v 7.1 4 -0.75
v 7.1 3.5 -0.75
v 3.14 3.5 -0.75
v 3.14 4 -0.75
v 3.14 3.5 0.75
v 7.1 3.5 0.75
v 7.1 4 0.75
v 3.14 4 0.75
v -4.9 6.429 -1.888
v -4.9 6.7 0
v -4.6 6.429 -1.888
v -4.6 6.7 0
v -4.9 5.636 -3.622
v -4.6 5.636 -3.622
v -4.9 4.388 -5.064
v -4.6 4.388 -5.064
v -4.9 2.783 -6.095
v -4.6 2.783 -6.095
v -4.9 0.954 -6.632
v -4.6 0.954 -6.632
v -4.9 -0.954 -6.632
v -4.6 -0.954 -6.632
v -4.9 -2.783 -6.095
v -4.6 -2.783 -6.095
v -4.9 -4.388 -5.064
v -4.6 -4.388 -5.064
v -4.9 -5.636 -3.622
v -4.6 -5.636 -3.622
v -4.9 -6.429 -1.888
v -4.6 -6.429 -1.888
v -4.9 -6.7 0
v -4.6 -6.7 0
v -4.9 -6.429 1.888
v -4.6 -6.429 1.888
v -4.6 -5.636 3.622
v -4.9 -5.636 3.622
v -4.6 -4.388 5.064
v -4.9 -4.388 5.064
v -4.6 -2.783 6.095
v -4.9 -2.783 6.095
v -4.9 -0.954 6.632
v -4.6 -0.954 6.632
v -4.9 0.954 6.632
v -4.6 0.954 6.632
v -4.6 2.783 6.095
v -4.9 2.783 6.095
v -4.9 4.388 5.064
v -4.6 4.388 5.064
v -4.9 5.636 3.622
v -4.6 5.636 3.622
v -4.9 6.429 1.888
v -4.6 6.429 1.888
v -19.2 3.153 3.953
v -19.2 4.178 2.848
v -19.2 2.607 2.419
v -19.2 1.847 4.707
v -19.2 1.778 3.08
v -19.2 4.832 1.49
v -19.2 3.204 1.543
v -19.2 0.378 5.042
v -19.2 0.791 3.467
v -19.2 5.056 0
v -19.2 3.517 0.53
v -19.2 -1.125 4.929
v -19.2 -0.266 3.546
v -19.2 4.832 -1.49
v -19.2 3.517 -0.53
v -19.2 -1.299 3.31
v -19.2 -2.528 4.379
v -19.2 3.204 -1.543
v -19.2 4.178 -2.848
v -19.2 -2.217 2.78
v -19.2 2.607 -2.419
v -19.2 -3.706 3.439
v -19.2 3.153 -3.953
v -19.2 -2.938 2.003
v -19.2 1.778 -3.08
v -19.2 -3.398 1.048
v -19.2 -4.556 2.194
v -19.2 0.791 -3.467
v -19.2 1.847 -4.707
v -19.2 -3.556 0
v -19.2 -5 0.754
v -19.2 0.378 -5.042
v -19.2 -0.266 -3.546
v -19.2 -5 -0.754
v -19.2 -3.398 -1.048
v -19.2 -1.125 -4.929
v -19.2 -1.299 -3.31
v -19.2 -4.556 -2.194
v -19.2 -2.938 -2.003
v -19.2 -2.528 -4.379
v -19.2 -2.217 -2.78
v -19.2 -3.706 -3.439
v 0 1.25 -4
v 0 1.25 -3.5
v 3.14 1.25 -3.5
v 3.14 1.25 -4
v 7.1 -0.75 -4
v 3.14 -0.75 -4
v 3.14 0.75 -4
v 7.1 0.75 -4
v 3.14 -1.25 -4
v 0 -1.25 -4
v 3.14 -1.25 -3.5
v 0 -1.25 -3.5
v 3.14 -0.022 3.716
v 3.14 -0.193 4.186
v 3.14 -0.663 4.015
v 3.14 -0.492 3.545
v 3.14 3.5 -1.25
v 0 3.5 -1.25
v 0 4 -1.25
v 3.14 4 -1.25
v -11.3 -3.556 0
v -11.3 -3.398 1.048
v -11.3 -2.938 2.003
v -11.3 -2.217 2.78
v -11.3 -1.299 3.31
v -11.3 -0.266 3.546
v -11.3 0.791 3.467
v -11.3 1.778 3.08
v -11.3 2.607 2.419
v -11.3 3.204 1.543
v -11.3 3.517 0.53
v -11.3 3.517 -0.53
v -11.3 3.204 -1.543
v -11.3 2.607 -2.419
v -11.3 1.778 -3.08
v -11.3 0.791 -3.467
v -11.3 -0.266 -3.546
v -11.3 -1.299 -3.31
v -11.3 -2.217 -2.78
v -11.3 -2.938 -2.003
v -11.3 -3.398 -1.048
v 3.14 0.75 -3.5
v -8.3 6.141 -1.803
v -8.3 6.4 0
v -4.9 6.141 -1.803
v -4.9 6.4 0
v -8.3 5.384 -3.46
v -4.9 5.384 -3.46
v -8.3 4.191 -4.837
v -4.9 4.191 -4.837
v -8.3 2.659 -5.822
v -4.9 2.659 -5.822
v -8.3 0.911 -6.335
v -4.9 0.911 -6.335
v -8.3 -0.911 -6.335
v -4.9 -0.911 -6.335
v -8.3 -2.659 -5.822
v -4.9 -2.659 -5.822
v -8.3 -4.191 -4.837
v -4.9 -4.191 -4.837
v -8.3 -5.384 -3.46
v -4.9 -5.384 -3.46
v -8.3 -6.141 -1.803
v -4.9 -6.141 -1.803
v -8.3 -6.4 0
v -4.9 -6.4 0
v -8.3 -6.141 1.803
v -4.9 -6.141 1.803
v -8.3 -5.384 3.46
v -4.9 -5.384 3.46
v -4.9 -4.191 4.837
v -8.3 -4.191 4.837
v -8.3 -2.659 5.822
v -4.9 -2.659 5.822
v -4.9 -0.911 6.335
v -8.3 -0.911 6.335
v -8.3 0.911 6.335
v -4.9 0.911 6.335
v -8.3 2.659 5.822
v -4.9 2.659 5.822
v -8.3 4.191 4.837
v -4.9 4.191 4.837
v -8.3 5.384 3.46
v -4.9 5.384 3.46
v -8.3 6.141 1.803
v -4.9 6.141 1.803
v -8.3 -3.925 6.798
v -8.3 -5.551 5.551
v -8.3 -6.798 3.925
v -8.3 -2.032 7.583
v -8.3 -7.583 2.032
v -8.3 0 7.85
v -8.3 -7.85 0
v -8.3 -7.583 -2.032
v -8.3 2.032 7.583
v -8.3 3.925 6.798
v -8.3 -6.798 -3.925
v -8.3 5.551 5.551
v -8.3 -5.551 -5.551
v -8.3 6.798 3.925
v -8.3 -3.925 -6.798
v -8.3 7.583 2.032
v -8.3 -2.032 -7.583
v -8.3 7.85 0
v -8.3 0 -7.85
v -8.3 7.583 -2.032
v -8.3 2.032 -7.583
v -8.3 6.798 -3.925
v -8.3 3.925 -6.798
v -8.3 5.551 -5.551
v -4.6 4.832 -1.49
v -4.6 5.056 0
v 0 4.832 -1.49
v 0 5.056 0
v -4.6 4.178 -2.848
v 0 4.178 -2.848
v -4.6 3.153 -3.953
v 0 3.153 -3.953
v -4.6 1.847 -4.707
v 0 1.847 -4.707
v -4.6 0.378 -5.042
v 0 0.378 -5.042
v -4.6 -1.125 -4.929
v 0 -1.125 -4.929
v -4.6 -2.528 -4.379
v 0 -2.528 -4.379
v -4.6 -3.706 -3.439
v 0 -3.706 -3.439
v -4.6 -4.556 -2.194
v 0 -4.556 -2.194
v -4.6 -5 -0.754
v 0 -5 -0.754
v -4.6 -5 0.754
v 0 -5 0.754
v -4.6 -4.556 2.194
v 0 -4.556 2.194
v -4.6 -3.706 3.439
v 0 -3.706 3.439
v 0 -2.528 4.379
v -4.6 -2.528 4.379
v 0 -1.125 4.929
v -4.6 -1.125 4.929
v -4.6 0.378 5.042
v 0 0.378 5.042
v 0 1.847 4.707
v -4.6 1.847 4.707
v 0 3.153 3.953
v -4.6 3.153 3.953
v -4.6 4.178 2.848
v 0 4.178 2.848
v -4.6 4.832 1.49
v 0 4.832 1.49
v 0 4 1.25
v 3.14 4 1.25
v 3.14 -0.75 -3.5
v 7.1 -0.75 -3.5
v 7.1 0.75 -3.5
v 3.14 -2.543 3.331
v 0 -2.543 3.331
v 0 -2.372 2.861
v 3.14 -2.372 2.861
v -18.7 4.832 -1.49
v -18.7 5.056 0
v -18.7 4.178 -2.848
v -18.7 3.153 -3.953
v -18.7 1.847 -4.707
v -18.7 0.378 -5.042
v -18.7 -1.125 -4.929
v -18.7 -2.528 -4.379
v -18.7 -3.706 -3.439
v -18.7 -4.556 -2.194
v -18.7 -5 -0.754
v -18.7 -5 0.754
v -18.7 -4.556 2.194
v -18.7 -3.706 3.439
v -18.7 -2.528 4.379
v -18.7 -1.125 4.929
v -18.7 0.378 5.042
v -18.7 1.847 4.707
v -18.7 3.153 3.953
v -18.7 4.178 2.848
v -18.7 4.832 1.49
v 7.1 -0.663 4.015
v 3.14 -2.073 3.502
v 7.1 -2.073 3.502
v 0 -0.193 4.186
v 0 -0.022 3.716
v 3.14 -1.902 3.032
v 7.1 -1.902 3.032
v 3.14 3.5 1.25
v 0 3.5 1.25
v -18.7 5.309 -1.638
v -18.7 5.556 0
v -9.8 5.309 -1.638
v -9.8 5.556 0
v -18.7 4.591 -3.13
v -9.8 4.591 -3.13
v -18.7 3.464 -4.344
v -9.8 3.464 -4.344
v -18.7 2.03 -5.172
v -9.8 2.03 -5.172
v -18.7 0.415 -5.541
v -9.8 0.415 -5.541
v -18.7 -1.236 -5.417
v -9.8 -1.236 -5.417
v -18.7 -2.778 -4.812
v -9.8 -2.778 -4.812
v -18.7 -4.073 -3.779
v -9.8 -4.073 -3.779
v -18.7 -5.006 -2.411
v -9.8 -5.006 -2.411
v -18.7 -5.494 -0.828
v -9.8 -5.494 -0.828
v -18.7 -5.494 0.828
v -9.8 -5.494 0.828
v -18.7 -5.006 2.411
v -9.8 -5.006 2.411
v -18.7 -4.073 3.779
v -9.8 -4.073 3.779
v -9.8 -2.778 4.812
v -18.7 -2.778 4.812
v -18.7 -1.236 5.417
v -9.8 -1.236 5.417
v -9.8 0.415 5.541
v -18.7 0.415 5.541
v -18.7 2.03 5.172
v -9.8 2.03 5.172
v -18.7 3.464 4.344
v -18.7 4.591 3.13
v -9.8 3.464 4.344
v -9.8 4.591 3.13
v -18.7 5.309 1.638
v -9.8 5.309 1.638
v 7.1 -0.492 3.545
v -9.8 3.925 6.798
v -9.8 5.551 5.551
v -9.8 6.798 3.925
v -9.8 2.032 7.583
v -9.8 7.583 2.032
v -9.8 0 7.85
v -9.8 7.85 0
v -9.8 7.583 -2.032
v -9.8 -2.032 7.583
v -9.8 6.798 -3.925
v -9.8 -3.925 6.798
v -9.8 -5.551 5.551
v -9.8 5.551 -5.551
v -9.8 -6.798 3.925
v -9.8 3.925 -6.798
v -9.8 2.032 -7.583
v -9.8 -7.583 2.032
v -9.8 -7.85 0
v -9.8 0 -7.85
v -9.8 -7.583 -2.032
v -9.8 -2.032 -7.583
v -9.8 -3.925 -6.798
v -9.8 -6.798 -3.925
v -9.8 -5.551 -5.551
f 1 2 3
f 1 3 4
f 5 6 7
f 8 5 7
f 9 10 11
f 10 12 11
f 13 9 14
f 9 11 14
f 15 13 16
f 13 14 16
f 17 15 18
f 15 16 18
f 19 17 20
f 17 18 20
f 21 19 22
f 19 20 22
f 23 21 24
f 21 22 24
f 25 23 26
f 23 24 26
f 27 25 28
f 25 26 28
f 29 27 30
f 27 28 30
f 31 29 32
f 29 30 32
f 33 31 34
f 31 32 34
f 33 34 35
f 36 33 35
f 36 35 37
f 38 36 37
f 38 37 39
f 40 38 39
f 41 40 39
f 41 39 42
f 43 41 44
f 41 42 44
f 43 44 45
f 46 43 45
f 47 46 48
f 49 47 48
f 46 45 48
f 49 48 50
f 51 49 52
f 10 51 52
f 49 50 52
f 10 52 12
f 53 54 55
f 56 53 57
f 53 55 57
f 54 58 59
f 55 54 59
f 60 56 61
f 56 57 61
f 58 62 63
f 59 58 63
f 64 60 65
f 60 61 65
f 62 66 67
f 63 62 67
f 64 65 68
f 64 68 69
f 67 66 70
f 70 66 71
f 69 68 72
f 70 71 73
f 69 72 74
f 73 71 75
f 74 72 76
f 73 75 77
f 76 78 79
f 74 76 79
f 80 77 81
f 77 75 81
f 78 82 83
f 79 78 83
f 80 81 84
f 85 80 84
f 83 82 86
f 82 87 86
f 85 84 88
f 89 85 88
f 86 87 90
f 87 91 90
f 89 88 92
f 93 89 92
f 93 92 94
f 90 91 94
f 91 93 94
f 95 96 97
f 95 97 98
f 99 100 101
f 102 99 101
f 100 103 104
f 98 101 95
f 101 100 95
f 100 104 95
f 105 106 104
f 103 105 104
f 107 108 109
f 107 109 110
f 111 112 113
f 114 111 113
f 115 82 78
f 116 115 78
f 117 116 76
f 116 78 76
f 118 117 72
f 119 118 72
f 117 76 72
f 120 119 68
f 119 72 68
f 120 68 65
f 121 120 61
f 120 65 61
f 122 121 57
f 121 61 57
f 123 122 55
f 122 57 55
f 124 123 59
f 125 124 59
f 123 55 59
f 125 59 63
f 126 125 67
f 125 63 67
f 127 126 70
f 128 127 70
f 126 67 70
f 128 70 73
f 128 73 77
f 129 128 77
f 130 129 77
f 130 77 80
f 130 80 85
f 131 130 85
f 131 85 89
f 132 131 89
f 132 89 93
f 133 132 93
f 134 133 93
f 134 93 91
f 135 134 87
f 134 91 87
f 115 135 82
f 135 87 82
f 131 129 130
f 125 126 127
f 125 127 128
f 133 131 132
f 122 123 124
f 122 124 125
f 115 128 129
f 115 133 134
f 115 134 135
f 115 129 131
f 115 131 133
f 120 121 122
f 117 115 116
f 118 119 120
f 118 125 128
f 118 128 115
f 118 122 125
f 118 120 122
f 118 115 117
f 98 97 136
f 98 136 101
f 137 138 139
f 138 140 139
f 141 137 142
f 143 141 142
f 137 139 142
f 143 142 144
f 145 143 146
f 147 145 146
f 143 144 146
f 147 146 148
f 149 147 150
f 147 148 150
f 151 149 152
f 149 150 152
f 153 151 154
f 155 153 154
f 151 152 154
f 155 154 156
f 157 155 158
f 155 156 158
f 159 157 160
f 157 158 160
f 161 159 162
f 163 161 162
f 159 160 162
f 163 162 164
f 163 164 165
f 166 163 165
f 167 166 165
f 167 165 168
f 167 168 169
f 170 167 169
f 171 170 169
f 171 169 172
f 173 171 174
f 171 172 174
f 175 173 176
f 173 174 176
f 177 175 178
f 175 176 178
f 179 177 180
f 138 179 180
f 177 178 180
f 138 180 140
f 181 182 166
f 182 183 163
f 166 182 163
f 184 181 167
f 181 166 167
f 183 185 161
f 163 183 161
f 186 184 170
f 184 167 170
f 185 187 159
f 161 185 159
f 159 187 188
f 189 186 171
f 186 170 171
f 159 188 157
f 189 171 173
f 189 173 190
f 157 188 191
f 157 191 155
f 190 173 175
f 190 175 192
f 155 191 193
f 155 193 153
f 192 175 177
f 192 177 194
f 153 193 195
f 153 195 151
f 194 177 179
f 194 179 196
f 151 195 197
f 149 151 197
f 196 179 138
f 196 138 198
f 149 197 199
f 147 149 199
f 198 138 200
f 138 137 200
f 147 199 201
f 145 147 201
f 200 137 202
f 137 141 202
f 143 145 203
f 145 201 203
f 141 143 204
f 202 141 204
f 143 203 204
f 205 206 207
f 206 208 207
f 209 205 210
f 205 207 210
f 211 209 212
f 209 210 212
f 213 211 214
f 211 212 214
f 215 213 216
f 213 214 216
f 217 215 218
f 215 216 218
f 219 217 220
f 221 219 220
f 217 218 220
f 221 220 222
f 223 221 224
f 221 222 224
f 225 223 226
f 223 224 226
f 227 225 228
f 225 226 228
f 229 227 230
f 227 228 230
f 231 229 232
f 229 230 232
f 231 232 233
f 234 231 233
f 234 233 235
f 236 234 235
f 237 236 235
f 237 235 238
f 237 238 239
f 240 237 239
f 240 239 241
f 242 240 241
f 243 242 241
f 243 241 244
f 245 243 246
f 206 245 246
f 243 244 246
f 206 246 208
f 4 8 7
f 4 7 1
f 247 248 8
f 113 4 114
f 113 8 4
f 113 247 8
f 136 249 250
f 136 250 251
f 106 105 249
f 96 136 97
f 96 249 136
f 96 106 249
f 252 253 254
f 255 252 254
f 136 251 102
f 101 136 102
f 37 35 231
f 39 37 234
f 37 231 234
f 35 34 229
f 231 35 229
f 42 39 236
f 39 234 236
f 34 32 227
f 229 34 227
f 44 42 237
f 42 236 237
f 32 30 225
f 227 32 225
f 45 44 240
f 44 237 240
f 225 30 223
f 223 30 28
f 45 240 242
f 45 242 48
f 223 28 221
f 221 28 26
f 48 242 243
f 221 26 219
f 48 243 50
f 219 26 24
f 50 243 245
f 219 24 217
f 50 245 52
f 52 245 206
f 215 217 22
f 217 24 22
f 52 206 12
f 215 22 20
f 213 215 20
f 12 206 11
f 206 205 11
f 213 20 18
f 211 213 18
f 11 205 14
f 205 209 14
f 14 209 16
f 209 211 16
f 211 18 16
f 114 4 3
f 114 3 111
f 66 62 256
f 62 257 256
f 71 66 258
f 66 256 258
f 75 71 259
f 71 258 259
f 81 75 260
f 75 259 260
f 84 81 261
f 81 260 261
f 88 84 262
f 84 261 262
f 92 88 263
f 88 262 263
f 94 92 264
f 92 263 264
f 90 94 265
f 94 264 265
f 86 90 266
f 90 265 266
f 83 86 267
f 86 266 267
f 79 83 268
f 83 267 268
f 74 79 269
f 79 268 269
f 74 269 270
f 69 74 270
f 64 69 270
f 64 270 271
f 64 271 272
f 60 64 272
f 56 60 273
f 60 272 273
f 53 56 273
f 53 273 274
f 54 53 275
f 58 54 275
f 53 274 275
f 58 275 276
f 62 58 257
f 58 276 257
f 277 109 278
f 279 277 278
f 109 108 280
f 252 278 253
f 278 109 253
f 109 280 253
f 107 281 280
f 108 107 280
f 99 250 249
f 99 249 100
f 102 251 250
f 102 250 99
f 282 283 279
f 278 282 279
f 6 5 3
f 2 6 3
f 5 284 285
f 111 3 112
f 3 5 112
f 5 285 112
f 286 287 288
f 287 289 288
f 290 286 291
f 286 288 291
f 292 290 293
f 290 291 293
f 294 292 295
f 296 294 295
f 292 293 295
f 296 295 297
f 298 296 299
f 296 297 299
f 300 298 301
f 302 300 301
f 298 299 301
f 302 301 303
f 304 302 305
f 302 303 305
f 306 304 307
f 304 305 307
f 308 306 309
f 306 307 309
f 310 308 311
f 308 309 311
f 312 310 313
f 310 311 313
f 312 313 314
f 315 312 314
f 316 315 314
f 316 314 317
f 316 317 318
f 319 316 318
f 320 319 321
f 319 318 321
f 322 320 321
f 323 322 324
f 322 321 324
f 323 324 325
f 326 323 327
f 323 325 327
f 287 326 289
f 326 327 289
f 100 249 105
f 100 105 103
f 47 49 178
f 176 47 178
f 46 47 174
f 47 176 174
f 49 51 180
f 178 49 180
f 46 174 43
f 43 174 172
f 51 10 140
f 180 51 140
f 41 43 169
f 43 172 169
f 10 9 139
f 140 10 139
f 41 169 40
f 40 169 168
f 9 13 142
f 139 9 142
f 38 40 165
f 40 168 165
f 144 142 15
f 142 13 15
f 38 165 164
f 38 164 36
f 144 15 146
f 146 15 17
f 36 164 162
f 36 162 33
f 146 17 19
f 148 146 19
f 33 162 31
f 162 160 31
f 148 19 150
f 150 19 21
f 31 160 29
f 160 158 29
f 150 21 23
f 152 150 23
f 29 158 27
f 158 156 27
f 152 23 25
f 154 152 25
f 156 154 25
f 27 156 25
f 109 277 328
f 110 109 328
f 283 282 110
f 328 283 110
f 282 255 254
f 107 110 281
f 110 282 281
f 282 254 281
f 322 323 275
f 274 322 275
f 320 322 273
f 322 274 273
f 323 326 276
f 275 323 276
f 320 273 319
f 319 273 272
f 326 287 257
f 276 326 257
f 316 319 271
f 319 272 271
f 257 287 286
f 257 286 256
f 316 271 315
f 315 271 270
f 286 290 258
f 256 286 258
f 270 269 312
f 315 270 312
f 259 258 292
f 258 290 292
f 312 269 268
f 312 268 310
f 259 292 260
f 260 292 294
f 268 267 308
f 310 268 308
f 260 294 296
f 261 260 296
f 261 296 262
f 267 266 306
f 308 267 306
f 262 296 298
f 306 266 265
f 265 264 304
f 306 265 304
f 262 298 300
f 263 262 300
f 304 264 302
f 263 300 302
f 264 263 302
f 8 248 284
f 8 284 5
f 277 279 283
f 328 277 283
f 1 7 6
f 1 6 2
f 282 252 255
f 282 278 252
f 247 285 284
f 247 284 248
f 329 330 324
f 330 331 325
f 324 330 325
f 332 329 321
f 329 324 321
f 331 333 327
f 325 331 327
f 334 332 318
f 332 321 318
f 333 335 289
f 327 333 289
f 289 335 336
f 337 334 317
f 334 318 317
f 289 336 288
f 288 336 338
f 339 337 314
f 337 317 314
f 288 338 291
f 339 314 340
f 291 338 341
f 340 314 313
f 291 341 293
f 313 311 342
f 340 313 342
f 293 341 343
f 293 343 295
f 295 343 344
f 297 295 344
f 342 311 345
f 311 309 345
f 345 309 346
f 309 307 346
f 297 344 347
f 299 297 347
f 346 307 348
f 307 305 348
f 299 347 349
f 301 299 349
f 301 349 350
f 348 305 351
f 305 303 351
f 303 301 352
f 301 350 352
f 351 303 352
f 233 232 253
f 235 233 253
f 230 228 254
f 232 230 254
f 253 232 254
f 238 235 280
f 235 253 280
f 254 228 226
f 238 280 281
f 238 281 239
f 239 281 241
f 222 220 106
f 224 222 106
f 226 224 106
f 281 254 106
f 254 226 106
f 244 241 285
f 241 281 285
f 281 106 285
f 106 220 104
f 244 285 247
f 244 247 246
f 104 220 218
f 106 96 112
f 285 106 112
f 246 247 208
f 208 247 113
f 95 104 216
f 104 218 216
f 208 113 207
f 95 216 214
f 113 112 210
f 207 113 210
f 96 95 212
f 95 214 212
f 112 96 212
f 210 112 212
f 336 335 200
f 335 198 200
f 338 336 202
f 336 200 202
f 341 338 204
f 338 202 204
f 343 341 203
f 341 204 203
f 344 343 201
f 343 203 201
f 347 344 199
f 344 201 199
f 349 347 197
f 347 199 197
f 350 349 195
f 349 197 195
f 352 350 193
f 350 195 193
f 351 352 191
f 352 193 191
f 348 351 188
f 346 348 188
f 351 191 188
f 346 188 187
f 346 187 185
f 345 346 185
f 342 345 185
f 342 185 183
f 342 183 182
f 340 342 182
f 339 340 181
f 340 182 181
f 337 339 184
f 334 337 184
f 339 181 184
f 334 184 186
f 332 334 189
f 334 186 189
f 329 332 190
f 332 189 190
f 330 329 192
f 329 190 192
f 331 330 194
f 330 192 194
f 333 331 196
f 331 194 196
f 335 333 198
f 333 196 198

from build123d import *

# Parameters (mm, degrees)
SKETCH2_R           = 3.55625
CUT_EXTRUDE1_DEPTH  = 7.9
SKETCH3_W           = 2.5
SKETCH3_H           = 0.5
SKETCH3_W_2         = 0.5
SKETCH3_H_2         = 2.5
EXTRUDE_THIN1_DEPTH = 7.1
SKETCH4_W           = 0.5
SKETCH4_H           = 0.5
CUT_EXTRUDE3_DEPTH  = 3.96


with BuildPart() as part:
    # Sketch1 → Revolve1 (revolve)
    with BuildSketch(Plane.XY):
        Polygon((-19.2, 0), (-19.2, 5.05625), (-18.7, 5.05625), (-18.7, 5.55625), (-9.8, 5.55625), (-9.8, 7.85), (-8.3, 7.85), (-8.3, 6.4), (-4.9, 6.4), (-4.9, 6.7), (-4.6, 6.7), (-4.6, 5.05625), (0, 5.05625), (0, 0), align=None)
    revolve(axis=Axis((0, 0, 0), (-1, 0, 0)))

    # Sketch2 → Cut-Extrude1 (cut)
    with BuildSketch(Plane.ZY.offset(19.2)):
        with Locations(Location((0, 0, 0), (0, 0, 270))):
            Circle(SKETCH2_R)
    extrude(amount=-CUT_EXTRUDE1_DEPTH, mode=Mode.SUBTRACT)

    # Sketch3 → Extrude-Thin1 (add)
    with BuildSketch(Plane(origin=(0, 0, 0), x_dir=(0, 0, -1), z_dir=(1, 0, 0))):
        with Locations((0, 3.75)):
            Rectangle(SKETCH3_W, SKETCH3_H)
        with Locations((3.75, 0)):
            Rectangle(SKETCH3_W_2, SKETCH3_H_2)
        Polygon((-4.186295662, -0.193464797), (-3.331245304, -2.542696349), (-2.861398994, -2.371686278), (-3.716449352, -0.022454726), align=None)
    extrude(amount=EXTRUDE_THIN1_DEPTH)

    # Sketch4 → Cut-Extrude3 (cut)
    with BuildSketch(Plane(origin=(7.1, 0, 0), x_dir=(0, 0, -1), z_dir=(1, 0, 0))):
        with Locations((-1, 3.75)):
            Rectangle(SKETCH4_W, SKETCH4_H)
        with Locations((1, 3.75)):
            Rectangle(SKETCH4_W, SKETCH4_H)
        with Locations((3.75, 1)):
            Rectangle(SKETCH4_W, SKETCH4_H)
        with Locations((3.75, -1)):
            Rectangle(SKETCH4_W, SKETCH4_H)
        Polygon((-3.331245304, -2.542696349), (-2.861398994, -2.371686278), (-3.032409065, -1.901839967), (-3.502255376, -2.072850039), align=None)
        Polygon((-3.716449352, -0.022454726), (-4.186295662, -0.193464797), (-4.015285591, -0.663311108), (-3.54543928, -0.492301036), align=None)
    extrude(amount=-CUT_EXTRUDE3_DEPTH, mode=Mode.SUBTRACT)


solid = part.part
